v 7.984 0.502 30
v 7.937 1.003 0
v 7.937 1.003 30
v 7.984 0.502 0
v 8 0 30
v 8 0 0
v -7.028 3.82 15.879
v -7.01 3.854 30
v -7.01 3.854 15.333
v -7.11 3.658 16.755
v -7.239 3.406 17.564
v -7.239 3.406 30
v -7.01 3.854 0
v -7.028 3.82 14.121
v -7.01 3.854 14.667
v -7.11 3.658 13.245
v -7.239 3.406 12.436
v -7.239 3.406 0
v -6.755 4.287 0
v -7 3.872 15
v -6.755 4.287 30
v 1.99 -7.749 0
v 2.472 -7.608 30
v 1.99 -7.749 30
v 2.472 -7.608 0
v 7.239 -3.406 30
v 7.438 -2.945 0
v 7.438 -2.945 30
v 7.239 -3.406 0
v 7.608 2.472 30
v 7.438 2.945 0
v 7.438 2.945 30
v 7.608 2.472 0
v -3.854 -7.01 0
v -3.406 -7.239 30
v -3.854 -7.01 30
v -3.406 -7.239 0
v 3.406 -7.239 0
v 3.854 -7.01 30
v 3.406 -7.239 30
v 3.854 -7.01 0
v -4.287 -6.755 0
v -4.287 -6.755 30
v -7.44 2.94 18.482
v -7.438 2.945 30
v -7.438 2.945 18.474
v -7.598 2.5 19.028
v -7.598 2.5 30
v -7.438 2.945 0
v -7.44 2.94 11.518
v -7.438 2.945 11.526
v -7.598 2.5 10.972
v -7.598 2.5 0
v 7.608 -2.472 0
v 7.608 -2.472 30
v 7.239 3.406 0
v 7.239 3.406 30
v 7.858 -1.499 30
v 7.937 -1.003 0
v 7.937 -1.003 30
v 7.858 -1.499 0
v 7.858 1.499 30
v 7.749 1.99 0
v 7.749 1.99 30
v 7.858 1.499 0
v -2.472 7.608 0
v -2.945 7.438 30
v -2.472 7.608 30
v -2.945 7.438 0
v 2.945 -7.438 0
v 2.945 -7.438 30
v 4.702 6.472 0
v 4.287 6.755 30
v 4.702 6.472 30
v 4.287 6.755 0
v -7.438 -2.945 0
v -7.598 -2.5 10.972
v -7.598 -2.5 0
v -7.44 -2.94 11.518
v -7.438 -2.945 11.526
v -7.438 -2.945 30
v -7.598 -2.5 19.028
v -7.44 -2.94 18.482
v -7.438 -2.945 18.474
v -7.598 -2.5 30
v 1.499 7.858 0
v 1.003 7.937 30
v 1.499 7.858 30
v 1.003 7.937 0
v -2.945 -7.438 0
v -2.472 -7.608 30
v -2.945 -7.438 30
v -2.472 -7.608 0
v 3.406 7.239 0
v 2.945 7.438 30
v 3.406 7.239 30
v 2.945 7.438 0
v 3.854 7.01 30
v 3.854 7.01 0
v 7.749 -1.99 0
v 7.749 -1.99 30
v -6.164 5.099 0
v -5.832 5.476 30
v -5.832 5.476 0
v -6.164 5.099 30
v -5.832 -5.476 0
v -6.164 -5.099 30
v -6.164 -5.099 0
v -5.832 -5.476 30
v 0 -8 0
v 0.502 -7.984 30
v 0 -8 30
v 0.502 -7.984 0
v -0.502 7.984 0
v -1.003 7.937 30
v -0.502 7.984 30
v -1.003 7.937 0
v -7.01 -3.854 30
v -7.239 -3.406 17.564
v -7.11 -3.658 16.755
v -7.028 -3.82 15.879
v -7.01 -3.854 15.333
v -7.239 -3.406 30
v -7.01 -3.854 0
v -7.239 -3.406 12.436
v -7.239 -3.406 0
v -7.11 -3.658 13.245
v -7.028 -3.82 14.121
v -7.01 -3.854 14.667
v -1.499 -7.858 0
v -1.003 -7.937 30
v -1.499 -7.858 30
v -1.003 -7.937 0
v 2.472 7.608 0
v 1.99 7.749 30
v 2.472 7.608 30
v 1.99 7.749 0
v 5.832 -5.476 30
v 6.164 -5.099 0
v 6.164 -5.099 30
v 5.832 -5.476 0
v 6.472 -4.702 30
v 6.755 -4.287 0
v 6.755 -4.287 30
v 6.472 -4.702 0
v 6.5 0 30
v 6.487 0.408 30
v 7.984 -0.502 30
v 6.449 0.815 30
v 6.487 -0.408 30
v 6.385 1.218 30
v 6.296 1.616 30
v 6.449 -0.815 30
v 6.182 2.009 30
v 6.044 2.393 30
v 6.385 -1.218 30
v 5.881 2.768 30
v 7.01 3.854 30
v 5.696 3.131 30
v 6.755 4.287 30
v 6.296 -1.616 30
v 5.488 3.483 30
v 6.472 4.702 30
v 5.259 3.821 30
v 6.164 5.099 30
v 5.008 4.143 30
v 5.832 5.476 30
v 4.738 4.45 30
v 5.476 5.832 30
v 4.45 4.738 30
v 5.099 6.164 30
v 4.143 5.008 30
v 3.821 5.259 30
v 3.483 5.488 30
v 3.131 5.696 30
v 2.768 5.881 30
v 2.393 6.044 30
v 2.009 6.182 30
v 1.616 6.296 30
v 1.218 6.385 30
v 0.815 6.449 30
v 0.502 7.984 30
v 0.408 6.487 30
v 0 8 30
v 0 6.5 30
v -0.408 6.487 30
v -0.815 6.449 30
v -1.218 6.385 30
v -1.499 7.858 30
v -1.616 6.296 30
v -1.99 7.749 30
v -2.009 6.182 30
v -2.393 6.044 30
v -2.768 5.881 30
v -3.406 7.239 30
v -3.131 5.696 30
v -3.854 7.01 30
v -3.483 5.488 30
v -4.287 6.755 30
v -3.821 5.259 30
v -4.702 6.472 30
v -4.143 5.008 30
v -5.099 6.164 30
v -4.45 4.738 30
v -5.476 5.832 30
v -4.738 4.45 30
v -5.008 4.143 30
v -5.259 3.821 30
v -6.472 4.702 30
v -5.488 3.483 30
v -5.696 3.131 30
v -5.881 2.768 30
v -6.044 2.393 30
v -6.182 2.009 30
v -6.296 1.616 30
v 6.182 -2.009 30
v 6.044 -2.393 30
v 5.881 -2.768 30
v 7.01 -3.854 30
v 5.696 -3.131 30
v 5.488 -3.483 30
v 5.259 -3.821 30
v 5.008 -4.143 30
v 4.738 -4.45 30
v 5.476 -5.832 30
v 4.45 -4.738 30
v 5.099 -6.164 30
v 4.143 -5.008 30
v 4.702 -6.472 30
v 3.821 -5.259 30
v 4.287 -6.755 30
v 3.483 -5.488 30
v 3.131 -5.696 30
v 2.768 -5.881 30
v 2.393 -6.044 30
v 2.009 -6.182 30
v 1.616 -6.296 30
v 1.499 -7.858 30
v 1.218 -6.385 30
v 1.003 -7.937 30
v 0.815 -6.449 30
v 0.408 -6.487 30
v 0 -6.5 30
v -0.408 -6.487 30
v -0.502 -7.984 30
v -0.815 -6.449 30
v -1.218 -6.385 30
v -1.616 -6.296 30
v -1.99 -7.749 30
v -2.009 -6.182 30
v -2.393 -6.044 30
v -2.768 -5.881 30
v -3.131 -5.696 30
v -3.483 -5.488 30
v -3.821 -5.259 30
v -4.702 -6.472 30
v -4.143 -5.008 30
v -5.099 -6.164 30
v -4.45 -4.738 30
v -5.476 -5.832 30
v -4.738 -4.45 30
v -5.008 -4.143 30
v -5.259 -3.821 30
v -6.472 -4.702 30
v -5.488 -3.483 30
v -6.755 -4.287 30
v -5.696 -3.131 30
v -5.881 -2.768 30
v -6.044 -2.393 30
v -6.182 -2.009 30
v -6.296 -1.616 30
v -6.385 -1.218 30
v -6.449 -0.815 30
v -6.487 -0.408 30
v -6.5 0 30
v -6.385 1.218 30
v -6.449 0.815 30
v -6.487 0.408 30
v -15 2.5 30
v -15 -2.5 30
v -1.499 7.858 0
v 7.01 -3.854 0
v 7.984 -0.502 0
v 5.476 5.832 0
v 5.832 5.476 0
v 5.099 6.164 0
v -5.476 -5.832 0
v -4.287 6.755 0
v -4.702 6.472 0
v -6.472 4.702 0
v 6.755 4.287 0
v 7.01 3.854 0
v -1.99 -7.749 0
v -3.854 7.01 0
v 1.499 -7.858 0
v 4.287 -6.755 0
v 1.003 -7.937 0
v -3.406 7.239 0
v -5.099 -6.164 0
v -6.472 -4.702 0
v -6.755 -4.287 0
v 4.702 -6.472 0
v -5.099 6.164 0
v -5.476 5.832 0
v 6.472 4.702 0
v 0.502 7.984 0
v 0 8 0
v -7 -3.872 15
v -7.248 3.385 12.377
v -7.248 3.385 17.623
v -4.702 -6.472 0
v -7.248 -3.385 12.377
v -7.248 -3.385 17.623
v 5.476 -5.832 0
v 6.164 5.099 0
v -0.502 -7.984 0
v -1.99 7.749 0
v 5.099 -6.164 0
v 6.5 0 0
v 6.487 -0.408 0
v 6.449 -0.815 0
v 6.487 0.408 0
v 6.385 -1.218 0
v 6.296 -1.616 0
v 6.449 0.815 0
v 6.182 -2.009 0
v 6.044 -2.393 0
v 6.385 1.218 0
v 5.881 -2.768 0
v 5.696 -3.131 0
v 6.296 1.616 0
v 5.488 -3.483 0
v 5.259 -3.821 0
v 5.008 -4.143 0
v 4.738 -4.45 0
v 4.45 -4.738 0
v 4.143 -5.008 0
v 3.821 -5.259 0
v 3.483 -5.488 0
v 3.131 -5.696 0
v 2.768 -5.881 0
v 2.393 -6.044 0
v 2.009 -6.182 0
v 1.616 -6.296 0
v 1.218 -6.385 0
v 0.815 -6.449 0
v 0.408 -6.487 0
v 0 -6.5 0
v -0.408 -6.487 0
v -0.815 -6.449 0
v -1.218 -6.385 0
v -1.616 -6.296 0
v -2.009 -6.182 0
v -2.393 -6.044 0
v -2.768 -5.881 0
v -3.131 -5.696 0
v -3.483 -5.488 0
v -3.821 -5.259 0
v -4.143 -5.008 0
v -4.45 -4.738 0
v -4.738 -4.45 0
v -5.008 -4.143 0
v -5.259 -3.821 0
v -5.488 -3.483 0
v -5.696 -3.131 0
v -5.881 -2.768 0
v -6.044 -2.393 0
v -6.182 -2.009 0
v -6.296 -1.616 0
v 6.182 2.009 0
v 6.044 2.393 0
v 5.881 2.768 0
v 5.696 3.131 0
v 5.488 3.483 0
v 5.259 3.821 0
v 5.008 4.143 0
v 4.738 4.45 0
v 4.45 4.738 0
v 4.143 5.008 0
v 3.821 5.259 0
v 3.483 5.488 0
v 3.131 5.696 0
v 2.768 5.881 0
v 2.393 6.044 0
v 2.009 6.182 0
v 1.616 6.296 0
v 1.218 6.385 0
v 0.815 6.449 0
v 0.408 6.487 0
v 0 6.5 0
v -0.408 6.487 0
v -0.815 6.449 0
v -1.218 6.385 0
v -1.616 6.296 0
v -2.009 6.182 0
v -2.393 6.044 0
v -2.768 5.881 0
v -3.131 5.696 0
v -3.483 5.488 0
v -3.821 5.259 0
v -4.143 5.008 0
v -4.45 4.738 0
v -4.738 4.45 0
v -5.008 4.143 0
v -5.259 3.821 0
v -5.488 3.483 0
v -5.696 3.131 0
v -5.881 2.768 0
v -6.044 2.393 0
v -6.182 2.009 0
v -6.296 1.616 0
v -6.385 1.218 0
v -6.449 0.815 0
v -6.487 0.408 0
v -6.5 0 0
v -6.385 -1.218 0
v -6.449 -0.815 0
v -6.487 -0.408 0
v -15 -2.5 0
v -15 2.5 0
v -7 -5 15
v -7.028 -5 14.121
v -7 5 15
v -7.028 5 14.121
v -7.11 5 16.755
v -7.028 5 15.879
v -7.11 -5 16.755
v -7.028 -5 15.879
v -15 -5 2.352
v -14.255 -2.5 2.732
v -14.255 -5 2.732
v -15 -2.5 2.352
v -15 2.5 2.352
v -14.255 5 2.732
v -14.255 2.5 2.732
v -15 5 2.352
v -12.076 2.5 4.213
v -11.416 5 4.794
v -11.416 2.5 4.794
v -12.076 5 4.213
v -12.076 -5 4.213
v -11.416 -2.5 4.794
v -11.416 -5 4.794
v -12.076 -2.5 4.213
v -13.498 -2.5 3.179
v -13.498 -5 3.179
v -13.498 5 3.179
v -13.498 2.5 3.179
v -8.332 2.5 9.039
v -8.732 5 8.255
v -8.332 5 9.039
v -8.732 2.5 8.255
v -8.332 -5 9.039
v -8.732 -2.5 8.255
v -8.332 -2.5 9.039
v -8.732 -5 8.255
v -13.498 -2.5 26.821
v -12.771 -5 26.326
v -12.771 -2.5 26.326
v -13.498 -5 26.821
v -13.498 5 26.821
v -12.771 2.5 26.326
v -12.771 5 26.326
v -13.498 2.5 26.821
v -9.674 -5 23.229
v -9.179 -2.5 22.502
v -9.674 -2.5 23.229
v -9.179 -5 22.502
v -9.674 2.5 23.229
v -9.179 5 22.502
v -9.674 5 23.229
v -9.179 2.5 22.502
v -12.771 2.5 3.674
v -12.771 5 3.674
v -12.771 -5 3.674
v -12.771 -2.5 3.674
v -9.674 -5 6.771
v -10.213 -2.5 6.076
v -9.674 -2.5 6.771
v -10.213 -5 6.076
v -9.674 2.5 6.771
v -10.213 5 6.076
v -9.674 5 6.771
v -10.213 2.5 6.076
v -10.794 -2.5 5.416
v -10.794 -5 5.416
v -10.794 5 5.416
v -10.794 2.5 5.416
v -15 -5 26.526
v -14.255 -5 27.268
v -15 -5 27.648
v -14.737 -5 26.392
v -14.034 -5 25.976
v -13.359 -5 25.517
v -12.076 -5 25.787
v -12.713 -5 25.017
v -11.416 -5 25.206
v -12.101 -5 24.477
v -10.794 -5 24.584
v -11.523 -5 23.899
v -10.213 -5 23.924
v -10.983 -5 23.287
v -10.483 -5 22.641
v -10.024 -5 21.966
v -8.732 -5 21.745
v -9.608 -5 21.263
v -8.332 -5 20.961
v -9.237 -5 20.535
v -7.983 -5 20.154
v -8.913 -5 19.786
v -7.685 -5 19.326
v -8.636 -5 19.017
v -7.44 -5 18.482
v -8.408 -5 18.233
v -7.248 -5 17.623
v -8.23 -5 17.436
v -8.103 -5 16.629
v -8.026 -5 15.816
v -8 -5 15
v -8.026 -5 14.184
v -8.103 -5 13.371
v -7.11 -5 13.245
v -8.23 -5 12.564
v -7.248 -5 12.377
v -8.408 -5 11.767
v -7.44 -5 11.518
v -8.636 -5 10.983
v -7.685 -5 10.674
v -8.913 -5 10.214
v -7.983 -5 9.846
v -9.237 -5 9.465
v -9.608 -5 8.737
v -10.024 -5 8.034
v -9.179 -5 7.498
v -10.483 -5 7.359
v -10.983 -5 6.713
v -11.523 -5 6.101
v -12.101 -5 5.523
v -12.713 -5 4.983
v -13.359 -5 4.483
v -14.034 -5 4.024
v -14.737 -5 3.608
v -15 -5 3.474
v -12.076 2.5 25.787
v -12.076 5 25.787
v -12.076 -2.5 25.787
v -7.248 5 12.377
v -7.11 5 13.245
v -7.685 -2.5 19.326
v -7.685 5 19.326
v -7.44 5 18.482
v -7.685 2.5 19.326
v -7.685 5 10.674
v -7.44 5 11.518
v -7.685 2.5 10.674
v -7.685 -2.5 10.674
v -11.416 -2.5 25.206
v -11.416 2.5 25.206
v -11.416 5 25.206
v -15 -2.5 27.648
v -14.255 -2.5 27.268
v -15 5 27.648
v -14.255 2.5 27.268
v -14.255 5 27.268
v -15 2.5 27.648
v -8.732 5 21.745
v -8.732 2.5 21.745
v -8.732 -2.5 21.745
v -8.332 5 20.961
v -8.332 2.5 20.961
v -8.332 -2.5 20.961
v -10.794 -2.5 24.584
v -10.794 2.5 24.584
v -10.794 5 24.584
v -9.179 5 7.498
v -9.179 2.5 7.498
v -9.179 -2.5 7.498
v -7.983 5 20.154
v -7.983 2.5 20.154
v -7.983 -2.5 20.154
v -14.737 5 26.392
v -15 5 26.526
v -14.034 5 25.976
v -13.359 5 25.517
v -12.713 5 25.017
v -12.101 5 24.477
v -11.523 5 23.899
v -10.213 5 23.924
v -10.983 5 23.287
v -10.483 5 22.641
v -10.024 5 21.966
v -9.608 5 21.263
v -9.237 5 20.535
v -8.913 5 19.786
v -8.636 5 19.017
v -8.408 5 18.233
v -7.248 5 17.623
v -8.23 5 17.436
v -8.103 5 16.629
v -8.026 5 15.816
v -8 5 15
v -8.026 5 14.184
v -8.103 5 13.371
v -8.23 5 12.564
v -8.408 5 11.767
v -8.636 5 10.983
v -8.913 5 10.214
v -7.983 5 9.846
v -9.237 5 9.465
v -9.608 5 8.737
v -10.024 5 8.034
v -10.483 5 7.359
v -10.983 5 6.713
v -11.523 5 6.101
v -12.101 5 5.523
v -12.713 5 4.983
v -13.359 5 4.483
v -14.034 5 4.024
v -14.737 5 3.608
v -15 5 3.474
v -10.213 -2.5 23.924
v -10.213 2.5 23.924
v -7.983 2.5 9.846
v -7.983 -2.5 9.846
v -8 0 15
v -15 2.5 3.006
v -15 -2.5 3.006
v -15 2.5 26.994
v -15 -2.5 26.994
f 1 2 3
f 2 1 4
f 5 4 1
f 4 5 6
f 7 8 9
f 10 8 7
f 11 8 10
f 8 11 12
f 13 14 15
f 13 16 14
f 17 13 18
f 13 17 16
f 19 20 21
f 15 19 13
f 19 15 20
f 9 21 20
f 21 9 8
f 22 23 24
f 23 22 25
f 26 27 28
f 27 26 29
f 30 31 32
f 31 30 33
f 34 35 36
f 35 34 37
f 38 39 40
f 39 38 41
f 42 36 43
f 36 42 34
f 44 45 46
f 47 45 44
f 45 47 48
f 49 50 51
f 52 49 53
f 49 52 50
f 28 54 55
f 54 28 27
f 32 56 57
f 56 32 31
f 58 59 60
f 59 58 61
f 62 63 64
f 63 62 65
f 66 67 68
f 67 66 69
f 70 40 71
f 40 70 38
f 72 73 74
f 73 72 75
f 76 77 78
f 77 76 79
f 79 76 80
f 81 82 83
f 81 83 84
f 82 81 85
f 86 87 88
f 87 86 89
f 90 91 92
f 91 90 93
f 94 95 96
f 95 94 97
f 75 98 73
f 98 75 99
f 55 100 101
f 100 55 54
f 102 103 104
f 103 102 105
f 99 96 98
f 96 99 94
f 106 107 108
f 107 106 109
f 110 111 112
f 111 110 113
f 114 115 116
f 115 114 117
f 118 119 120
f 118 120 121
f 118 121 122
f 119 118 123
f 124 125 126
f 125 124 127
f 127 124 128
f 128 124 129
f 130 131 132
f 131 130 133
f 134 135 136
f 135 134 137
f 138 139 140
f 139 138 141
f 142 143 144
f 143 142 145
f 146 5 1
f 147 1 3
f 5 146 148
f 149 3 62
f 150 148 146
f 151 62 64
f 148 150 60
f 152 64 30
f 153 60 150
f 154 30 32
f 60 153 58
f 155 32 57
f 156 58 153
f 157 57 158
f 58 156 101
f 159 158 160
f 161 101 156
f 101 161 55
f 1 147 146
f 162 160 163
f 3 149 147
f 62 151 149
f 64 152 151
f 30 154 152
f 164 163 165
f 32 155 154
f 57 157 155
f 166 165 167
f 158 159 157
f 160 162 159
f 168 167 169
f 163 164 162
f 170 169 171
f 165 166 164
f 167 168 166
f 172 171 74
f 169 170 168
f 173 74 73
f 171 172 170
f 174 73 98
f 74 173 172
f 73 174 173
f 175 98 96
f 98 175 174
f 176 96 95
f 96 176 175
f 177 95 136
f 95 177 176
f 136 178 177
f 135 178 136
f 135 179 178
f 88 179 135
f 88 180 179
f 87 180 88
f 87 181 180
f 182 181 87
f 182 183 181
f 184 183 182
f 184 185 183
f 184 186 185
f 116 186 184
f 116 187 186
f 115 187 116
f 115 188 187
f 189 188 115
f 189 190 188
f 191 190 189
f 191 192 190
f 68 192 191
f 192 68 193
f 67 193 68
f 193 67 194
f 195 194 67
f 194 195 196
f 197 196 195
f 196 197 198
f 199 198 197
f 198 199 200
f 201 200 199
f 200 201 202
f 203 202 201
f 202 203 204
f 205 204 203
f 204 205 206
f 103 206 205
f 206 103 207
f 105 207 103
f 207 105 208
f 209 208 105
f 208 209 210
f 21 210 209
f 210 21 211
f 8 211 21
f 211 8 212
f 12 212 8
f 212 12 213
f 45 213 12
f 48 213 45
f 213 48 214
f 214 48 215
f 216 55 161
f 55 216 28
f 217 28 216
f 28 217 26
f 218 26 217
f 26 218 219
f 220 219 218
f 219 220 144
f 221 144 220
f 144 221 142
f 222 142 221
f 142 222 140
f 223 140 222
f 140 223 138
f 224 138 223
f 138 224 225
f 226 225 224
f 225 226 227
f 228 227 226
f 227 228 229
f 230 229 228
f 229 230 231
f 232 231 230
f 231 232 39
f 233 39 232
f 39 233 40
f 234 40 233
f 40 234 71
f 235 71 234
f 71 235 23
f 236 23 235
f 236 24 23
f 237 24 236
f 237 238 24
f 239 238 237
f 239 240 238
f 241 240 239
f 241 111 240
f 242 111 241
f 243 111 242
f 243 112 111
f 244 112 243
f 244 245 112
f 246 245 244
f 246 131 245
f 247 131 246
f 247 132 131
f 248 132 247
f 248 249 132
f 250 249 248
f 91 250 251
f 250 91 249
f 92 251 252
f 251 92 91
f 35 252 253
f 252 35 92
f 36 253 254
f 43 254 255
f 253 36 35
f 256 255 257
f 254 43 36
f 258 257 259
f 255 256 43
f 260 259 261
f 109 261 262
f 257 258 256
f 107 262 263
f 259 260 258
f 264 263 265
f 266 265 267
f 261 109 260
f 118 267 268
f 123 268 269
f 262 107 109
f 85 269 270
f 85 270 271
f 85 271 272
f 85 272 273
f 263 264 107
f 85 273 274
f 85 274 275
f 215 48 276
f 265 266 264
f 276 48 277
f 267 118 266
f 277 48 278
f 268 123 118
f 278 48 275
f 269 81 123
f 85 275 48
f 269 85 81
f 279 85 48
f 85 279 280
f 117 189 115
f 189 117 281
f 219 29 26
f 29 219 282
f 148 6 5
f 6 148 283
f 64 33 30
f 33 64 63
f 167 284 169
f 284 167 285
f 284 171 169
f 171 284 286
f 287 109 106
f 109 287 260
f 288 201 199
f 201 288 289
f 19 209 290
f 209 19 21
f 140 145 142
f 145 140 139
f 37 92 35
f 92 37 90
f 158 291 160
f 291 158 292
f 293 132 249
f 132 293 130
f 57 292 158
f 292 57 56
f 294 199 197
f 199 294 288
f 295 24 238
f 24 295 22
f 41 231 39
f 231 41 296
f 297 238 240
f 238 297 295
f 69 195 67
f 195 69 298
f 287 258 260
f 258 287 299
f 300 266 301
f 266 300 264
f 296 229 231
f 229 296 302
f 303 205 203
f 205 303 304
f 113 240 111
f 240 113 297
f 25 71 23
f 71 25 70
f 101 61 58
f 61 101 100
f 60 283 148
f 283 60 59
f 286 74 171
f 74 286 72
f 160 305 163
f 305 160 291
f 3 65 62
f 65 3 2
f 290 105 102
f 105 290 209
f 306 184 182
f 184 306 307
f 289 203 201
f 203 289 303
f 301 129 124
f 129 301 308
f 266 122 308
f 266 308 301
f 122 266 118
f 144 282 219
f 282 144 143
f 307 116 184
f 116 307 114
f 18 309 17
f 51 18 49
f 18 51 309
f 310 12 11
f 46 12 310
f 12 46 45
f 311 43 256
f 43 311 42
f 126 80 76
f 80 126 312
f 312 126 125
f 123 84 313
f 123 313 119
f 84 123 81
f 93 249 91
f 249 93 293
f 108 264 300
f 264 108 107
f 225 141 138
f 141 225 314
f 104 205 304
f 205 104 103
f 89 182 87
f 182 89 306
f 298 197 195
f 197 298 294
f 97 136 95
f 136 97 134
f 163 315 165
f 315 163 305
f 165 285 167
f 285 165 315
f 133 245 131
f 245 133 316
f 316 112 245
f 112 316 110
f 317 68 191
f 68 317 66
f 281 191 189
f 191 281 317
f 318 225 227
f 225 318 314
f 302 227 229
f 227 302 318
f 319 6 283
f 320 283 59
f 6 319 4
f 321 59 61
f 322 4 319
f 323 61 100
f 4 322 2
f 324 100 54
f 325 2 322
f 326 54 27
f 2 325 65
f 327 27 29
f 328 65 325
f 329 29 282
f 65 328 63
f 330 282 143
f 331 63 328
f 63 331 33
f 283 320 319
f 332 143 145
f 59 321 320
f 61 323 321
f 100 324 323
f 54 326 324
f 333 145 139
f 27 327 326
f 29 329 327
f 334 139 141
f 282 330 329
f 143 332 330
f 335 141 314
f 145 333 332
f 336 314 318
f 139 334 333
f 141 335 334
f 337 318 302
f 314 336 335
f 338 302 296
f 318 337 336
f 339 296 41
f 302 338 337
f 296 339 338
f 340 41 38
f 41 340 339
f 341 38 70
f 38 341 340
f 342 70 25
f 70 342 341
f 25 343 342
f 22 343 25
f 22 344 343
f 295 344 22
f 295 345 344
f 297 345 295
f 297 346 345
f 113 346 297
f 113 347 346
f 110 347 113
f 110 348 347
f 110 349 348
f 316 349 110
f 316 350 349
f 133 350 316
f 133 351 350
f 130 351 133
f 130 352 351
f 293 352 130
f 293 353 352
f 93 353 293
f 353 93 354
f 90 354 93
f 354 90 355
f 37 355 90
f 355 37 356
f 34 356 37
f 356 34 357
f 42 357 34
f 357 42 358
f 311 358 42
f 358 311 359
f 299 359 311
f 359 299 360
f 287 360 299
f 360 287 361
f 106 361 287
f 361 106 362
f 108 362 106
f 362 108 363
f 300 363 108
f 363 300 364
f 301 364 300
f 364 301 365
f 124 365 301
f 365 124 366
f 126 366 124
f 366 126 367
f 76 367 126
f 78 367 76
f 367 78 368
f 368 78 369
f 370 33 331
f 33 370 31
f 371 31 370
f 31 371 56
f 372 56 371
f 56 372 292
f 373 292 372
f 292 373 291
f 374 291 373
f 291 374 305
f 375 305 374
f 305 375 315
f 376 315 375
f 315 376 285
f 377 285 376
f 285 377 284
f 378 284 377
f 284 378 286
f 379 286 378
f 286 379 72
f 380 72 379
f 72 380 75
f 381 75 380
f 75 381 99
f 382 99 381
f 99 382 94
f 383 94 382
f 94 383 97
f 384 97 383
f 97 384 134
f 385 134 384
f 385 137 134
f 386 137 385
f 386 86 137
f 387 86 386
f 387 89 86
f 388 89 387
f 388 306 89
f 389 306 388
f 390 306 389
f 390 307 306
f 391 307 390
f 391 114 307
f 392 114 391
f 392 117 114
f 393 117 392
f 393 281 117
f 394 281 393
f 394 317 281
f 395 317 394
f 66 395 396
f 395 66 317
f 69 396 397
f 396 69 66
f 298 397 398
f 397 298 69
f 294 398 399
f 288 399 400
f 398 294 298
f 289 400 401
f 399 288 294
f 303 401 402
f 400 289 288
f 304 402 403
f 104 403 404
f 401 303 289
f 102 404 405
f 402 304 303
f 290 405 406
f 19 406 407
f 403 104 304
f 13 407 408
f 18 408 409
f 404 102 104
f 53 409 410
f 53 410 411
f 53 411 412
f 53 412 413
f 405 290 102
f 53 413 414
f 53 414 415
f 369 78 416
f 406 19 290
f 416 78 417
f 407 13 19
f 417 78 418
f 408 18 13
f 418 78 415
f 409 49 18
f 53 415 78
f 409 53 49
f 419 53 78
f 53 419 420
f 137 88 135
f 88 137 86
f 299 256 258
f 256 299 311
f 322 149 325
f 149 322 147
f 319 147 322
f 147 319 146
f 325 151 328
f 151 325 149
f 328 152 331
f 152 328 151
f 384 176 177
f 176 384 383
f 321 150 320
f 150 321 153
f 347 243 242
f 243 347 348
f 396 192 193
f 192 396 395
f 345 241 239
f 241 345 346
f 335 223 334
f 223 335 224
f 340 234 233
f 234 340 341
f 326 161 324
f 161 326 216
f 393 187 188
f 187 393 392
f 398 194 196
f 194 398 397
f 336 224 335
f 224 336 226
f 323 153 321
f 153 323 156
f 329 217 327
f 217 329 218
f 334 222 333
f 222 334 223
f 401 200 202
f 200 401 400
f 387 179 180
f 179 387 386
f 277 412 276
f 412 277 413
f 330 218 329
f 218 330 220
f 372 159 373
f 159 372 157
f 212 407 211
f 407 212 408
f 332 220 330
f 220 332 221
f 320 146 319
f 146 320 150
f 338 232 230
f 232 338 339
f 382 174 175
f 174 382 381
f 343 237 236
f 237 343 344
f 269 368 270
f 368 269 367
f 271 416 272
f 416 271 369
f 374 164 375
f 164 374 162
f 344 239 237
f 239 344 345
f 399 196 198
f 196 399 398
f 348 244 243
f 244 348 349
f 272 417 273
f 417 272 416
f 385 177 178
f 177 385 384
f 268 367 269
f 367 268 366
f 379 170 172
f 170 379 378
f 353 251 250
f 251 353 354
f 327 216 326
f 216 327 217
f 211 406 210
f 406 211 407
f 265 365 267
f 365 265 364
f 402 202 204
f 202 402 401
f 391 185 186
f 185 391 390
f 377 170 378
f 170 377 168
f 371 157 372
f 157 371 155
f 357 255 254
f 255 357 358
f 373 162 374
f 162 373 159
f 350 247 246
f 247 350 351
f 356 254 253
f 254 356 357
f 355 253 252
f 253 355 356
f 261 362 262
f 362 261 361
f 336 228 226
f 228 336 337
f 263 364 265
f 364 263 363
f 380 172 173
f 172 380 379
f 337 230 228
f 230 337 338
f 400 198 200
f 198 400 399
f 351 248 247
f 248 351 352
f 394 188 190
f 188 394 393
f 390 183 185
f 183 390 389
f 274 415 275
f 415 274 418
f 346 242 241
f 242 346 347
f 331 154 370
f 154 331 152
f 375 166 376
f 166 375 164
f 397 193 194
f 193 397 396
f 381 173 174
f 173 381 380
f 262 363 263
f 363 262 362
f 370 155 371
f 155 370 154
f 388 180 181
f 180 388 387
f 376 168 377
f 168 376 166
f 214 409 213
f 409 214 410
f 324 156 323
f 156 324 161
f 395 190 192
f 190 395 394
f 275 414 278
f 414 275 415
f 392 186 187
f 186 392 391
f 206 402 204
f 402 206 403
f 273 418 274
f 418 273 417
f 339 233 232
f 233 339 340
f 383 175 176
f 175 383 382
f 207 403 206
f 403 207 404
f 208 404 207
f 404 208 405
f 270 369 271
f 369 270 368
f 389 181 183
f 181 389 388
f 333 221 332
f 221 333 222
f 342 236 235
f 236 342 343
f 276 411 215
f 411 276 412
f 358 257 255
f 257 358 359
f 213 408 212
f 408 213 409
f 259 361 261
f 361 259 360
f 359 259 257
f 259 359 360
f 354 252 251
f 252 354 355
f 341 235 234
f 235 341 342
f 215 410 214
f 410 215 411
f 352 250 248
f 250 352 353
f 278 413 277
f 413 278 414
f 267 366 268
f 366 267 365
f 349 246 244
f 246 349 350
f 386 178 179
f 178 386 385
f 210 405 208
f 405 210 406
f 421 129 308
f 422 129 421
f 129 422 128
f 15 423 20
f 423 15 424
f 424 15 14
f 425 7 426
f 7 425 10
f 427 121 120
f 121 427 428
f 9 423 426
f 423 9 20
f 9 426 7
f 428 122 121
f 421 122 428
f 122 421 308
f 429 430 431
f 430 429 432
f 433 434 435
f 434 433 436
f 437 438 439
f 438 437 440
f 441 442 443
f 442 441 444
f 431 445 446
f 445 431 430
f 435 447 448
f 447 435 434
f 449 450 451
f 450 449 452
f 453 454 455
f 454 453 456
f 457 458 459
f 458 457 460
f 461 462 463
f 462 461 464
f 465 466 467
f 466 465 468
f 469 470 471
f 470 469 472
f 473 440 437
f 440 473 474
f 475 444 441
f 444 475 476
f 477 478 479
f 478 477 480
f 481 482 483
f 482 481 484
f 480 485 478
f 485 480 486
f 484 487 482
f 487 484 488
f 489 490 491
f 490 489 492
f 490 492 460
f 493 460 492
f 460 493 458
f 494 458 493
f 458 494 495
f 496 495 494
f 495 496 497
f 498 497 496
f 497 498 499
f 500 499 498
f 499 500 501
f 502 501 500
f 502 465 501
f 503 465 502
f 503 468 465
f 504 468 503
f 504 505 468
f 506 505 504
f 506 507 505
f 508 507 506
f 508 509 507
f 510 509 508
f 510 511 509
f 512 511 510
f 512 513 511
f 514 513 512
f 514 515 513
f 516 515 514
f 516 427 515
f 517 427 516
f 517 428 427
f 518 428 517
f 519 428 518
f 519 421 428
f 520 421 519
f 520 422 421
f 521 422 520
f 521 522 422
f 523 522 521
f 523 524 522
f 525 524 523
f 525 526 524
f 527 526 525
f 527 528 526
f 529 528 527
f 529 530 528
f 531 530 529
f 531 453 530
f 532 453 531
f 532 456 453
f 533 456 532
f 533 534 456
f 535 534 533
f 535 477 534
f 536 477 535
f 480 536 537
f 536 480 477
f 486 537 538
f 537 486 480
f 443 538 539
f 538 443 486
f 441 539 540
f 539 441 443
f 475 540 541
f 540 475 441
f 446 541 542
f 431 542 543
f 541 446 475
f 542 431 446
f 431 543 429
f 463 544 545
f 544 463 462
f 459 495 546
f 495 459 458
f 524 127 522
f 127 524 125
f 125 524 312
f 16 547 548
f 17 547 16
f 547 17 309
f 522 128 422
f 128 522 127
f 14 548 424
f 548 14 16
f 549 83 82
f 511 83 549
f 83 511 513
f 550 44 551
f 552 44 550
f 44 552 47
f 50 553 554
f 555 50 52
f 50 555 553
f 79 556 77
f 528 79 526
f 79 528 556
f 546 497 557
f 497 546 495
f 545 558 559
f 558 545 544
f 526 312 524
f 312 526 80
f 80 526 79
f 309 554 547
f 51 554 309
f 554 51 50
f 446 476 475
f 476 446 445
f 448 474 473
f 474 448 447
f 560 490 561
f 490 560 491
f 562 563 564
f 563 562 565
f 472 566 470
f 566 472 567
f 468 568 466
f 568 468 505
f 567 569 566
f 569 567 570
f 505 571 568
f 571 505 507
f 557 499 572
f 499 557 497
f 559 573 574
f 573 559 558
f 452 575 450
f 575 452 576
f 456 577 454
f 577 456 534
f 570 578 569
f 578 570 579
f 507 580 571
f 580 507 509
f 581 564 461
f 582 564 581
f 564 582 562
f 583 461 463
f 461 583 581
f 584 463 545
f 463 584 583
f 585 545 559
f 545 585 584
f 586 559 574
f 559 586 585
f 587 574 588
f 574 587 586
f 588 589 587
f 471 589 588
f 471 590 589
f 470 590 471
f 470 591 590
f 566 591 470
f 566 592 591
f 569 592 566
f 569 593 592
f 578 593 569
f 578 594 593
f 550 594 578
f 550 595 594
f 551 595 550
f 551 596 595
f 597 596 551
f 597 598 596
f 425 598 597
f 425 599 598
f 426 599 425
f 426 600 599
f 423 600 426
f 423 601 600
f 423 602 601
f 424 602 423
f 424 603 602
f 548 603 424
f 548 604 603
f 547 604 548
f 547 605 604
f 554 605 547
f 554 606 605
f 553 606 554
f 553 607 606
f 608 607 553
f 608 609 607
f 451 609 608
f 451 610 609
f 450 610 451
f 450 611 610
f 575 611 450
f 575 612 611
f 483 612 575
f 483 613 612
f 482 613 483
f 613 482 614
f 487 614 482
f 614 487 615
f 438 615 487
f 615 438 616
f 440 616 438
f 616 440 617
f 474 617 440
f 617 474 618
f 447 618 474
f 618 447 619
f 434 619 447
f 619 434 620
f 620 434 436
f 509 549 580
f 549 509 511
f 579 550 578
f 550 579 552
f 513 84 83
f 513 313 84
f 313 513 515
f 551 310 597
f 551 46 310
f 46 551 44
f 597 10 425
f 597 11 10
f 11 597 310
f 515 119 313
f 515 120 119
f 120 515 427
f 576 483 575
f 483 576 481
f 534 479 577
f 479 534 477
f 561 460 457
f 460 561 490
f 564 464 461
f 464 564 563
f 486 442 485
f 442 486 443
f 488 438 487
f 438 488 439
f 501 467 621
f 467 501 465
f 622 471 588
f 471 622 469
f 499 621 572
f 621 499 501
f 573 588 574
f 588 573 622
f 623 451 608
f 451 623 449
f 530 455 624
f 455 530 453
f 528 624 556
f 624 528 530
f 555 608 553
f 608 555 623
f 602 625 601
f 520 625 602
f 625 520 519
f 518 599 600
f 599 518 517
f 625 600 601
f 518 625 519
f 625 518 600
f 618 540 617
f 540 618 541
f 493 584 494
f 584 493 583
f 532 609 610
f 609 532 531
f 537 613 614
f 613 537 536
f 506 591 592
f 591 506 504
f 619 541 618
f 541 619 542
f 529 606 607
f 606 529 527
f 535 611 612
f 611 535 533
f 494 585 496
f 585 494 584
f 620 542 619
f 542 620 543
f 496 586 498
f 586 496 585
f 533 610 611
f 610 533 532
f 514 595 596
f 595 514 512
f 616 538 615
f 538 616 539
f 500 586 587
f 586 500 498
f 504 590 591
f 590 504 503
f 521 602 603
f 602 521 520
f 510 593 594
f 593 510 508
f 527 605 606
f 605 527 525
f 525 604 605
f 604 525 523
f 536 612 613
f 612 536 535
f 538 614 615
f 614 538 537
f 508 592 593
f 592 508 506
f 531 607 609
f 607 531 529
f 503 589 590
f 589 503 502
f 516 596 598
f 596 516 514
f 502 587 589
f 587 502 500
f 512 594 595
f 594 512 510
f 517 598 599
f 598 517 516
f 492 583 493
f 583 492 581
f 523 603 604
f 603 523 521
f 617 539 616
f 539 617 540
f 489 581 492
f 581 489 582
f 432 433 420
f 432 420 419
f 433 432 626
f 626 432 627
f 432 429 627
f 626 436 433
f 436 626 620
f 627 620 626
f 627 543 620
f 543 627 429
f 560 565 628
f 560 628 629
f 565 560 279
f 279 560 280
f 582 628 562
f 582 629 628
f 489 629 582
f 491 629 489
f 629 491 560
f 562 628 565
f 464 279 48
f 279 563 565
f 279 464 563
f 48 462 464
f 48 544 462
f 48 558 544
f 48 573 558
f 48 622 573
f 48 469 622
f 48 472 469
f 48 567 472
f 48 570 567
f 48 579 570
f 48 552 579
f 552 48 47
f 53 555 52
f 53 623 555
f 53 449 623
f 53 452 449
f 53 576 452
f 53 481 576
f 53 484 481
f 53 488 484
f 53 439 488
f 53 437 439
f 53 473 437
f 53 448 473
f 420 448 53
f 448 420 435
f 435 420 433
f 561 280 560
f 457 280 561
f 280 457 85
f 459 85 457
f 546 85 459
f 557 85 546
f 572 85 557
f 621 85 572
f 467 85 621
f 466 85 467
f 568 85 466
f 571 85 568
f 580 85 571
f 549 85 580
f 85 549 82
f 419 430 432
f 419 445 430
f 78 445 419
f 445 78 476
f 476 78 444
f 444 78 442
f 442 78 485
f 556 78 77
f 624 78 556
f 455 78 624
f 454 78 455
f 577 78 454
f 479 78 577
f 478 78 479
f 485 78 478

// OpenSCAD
// 13, 26
$fn=100;

difference() {
    cylinder(h=30,d=16);
    translate([0,0,-0.5]) cylinder(h=31,d=13);
}
rotate([90,0,0]) translate([-6-15, 15, -5]) difference() {
    difference() {
        cylinder(h=10, d=28);
        translate([0,0,-0.5]) cylinder(h=11, d=26);
    }
    translate([-14,-14, -0.5]) cube([20,28,14]);
}
translate([-20, 2.5, 15]) rotate([90,0,0]) linear_extrude(5) difference() {
    difference() {
        translate([-13.5,-15]) square([27,30]);
        circle(d=26);
    }
    translate([-26,-26]) square([31,52]);
}
